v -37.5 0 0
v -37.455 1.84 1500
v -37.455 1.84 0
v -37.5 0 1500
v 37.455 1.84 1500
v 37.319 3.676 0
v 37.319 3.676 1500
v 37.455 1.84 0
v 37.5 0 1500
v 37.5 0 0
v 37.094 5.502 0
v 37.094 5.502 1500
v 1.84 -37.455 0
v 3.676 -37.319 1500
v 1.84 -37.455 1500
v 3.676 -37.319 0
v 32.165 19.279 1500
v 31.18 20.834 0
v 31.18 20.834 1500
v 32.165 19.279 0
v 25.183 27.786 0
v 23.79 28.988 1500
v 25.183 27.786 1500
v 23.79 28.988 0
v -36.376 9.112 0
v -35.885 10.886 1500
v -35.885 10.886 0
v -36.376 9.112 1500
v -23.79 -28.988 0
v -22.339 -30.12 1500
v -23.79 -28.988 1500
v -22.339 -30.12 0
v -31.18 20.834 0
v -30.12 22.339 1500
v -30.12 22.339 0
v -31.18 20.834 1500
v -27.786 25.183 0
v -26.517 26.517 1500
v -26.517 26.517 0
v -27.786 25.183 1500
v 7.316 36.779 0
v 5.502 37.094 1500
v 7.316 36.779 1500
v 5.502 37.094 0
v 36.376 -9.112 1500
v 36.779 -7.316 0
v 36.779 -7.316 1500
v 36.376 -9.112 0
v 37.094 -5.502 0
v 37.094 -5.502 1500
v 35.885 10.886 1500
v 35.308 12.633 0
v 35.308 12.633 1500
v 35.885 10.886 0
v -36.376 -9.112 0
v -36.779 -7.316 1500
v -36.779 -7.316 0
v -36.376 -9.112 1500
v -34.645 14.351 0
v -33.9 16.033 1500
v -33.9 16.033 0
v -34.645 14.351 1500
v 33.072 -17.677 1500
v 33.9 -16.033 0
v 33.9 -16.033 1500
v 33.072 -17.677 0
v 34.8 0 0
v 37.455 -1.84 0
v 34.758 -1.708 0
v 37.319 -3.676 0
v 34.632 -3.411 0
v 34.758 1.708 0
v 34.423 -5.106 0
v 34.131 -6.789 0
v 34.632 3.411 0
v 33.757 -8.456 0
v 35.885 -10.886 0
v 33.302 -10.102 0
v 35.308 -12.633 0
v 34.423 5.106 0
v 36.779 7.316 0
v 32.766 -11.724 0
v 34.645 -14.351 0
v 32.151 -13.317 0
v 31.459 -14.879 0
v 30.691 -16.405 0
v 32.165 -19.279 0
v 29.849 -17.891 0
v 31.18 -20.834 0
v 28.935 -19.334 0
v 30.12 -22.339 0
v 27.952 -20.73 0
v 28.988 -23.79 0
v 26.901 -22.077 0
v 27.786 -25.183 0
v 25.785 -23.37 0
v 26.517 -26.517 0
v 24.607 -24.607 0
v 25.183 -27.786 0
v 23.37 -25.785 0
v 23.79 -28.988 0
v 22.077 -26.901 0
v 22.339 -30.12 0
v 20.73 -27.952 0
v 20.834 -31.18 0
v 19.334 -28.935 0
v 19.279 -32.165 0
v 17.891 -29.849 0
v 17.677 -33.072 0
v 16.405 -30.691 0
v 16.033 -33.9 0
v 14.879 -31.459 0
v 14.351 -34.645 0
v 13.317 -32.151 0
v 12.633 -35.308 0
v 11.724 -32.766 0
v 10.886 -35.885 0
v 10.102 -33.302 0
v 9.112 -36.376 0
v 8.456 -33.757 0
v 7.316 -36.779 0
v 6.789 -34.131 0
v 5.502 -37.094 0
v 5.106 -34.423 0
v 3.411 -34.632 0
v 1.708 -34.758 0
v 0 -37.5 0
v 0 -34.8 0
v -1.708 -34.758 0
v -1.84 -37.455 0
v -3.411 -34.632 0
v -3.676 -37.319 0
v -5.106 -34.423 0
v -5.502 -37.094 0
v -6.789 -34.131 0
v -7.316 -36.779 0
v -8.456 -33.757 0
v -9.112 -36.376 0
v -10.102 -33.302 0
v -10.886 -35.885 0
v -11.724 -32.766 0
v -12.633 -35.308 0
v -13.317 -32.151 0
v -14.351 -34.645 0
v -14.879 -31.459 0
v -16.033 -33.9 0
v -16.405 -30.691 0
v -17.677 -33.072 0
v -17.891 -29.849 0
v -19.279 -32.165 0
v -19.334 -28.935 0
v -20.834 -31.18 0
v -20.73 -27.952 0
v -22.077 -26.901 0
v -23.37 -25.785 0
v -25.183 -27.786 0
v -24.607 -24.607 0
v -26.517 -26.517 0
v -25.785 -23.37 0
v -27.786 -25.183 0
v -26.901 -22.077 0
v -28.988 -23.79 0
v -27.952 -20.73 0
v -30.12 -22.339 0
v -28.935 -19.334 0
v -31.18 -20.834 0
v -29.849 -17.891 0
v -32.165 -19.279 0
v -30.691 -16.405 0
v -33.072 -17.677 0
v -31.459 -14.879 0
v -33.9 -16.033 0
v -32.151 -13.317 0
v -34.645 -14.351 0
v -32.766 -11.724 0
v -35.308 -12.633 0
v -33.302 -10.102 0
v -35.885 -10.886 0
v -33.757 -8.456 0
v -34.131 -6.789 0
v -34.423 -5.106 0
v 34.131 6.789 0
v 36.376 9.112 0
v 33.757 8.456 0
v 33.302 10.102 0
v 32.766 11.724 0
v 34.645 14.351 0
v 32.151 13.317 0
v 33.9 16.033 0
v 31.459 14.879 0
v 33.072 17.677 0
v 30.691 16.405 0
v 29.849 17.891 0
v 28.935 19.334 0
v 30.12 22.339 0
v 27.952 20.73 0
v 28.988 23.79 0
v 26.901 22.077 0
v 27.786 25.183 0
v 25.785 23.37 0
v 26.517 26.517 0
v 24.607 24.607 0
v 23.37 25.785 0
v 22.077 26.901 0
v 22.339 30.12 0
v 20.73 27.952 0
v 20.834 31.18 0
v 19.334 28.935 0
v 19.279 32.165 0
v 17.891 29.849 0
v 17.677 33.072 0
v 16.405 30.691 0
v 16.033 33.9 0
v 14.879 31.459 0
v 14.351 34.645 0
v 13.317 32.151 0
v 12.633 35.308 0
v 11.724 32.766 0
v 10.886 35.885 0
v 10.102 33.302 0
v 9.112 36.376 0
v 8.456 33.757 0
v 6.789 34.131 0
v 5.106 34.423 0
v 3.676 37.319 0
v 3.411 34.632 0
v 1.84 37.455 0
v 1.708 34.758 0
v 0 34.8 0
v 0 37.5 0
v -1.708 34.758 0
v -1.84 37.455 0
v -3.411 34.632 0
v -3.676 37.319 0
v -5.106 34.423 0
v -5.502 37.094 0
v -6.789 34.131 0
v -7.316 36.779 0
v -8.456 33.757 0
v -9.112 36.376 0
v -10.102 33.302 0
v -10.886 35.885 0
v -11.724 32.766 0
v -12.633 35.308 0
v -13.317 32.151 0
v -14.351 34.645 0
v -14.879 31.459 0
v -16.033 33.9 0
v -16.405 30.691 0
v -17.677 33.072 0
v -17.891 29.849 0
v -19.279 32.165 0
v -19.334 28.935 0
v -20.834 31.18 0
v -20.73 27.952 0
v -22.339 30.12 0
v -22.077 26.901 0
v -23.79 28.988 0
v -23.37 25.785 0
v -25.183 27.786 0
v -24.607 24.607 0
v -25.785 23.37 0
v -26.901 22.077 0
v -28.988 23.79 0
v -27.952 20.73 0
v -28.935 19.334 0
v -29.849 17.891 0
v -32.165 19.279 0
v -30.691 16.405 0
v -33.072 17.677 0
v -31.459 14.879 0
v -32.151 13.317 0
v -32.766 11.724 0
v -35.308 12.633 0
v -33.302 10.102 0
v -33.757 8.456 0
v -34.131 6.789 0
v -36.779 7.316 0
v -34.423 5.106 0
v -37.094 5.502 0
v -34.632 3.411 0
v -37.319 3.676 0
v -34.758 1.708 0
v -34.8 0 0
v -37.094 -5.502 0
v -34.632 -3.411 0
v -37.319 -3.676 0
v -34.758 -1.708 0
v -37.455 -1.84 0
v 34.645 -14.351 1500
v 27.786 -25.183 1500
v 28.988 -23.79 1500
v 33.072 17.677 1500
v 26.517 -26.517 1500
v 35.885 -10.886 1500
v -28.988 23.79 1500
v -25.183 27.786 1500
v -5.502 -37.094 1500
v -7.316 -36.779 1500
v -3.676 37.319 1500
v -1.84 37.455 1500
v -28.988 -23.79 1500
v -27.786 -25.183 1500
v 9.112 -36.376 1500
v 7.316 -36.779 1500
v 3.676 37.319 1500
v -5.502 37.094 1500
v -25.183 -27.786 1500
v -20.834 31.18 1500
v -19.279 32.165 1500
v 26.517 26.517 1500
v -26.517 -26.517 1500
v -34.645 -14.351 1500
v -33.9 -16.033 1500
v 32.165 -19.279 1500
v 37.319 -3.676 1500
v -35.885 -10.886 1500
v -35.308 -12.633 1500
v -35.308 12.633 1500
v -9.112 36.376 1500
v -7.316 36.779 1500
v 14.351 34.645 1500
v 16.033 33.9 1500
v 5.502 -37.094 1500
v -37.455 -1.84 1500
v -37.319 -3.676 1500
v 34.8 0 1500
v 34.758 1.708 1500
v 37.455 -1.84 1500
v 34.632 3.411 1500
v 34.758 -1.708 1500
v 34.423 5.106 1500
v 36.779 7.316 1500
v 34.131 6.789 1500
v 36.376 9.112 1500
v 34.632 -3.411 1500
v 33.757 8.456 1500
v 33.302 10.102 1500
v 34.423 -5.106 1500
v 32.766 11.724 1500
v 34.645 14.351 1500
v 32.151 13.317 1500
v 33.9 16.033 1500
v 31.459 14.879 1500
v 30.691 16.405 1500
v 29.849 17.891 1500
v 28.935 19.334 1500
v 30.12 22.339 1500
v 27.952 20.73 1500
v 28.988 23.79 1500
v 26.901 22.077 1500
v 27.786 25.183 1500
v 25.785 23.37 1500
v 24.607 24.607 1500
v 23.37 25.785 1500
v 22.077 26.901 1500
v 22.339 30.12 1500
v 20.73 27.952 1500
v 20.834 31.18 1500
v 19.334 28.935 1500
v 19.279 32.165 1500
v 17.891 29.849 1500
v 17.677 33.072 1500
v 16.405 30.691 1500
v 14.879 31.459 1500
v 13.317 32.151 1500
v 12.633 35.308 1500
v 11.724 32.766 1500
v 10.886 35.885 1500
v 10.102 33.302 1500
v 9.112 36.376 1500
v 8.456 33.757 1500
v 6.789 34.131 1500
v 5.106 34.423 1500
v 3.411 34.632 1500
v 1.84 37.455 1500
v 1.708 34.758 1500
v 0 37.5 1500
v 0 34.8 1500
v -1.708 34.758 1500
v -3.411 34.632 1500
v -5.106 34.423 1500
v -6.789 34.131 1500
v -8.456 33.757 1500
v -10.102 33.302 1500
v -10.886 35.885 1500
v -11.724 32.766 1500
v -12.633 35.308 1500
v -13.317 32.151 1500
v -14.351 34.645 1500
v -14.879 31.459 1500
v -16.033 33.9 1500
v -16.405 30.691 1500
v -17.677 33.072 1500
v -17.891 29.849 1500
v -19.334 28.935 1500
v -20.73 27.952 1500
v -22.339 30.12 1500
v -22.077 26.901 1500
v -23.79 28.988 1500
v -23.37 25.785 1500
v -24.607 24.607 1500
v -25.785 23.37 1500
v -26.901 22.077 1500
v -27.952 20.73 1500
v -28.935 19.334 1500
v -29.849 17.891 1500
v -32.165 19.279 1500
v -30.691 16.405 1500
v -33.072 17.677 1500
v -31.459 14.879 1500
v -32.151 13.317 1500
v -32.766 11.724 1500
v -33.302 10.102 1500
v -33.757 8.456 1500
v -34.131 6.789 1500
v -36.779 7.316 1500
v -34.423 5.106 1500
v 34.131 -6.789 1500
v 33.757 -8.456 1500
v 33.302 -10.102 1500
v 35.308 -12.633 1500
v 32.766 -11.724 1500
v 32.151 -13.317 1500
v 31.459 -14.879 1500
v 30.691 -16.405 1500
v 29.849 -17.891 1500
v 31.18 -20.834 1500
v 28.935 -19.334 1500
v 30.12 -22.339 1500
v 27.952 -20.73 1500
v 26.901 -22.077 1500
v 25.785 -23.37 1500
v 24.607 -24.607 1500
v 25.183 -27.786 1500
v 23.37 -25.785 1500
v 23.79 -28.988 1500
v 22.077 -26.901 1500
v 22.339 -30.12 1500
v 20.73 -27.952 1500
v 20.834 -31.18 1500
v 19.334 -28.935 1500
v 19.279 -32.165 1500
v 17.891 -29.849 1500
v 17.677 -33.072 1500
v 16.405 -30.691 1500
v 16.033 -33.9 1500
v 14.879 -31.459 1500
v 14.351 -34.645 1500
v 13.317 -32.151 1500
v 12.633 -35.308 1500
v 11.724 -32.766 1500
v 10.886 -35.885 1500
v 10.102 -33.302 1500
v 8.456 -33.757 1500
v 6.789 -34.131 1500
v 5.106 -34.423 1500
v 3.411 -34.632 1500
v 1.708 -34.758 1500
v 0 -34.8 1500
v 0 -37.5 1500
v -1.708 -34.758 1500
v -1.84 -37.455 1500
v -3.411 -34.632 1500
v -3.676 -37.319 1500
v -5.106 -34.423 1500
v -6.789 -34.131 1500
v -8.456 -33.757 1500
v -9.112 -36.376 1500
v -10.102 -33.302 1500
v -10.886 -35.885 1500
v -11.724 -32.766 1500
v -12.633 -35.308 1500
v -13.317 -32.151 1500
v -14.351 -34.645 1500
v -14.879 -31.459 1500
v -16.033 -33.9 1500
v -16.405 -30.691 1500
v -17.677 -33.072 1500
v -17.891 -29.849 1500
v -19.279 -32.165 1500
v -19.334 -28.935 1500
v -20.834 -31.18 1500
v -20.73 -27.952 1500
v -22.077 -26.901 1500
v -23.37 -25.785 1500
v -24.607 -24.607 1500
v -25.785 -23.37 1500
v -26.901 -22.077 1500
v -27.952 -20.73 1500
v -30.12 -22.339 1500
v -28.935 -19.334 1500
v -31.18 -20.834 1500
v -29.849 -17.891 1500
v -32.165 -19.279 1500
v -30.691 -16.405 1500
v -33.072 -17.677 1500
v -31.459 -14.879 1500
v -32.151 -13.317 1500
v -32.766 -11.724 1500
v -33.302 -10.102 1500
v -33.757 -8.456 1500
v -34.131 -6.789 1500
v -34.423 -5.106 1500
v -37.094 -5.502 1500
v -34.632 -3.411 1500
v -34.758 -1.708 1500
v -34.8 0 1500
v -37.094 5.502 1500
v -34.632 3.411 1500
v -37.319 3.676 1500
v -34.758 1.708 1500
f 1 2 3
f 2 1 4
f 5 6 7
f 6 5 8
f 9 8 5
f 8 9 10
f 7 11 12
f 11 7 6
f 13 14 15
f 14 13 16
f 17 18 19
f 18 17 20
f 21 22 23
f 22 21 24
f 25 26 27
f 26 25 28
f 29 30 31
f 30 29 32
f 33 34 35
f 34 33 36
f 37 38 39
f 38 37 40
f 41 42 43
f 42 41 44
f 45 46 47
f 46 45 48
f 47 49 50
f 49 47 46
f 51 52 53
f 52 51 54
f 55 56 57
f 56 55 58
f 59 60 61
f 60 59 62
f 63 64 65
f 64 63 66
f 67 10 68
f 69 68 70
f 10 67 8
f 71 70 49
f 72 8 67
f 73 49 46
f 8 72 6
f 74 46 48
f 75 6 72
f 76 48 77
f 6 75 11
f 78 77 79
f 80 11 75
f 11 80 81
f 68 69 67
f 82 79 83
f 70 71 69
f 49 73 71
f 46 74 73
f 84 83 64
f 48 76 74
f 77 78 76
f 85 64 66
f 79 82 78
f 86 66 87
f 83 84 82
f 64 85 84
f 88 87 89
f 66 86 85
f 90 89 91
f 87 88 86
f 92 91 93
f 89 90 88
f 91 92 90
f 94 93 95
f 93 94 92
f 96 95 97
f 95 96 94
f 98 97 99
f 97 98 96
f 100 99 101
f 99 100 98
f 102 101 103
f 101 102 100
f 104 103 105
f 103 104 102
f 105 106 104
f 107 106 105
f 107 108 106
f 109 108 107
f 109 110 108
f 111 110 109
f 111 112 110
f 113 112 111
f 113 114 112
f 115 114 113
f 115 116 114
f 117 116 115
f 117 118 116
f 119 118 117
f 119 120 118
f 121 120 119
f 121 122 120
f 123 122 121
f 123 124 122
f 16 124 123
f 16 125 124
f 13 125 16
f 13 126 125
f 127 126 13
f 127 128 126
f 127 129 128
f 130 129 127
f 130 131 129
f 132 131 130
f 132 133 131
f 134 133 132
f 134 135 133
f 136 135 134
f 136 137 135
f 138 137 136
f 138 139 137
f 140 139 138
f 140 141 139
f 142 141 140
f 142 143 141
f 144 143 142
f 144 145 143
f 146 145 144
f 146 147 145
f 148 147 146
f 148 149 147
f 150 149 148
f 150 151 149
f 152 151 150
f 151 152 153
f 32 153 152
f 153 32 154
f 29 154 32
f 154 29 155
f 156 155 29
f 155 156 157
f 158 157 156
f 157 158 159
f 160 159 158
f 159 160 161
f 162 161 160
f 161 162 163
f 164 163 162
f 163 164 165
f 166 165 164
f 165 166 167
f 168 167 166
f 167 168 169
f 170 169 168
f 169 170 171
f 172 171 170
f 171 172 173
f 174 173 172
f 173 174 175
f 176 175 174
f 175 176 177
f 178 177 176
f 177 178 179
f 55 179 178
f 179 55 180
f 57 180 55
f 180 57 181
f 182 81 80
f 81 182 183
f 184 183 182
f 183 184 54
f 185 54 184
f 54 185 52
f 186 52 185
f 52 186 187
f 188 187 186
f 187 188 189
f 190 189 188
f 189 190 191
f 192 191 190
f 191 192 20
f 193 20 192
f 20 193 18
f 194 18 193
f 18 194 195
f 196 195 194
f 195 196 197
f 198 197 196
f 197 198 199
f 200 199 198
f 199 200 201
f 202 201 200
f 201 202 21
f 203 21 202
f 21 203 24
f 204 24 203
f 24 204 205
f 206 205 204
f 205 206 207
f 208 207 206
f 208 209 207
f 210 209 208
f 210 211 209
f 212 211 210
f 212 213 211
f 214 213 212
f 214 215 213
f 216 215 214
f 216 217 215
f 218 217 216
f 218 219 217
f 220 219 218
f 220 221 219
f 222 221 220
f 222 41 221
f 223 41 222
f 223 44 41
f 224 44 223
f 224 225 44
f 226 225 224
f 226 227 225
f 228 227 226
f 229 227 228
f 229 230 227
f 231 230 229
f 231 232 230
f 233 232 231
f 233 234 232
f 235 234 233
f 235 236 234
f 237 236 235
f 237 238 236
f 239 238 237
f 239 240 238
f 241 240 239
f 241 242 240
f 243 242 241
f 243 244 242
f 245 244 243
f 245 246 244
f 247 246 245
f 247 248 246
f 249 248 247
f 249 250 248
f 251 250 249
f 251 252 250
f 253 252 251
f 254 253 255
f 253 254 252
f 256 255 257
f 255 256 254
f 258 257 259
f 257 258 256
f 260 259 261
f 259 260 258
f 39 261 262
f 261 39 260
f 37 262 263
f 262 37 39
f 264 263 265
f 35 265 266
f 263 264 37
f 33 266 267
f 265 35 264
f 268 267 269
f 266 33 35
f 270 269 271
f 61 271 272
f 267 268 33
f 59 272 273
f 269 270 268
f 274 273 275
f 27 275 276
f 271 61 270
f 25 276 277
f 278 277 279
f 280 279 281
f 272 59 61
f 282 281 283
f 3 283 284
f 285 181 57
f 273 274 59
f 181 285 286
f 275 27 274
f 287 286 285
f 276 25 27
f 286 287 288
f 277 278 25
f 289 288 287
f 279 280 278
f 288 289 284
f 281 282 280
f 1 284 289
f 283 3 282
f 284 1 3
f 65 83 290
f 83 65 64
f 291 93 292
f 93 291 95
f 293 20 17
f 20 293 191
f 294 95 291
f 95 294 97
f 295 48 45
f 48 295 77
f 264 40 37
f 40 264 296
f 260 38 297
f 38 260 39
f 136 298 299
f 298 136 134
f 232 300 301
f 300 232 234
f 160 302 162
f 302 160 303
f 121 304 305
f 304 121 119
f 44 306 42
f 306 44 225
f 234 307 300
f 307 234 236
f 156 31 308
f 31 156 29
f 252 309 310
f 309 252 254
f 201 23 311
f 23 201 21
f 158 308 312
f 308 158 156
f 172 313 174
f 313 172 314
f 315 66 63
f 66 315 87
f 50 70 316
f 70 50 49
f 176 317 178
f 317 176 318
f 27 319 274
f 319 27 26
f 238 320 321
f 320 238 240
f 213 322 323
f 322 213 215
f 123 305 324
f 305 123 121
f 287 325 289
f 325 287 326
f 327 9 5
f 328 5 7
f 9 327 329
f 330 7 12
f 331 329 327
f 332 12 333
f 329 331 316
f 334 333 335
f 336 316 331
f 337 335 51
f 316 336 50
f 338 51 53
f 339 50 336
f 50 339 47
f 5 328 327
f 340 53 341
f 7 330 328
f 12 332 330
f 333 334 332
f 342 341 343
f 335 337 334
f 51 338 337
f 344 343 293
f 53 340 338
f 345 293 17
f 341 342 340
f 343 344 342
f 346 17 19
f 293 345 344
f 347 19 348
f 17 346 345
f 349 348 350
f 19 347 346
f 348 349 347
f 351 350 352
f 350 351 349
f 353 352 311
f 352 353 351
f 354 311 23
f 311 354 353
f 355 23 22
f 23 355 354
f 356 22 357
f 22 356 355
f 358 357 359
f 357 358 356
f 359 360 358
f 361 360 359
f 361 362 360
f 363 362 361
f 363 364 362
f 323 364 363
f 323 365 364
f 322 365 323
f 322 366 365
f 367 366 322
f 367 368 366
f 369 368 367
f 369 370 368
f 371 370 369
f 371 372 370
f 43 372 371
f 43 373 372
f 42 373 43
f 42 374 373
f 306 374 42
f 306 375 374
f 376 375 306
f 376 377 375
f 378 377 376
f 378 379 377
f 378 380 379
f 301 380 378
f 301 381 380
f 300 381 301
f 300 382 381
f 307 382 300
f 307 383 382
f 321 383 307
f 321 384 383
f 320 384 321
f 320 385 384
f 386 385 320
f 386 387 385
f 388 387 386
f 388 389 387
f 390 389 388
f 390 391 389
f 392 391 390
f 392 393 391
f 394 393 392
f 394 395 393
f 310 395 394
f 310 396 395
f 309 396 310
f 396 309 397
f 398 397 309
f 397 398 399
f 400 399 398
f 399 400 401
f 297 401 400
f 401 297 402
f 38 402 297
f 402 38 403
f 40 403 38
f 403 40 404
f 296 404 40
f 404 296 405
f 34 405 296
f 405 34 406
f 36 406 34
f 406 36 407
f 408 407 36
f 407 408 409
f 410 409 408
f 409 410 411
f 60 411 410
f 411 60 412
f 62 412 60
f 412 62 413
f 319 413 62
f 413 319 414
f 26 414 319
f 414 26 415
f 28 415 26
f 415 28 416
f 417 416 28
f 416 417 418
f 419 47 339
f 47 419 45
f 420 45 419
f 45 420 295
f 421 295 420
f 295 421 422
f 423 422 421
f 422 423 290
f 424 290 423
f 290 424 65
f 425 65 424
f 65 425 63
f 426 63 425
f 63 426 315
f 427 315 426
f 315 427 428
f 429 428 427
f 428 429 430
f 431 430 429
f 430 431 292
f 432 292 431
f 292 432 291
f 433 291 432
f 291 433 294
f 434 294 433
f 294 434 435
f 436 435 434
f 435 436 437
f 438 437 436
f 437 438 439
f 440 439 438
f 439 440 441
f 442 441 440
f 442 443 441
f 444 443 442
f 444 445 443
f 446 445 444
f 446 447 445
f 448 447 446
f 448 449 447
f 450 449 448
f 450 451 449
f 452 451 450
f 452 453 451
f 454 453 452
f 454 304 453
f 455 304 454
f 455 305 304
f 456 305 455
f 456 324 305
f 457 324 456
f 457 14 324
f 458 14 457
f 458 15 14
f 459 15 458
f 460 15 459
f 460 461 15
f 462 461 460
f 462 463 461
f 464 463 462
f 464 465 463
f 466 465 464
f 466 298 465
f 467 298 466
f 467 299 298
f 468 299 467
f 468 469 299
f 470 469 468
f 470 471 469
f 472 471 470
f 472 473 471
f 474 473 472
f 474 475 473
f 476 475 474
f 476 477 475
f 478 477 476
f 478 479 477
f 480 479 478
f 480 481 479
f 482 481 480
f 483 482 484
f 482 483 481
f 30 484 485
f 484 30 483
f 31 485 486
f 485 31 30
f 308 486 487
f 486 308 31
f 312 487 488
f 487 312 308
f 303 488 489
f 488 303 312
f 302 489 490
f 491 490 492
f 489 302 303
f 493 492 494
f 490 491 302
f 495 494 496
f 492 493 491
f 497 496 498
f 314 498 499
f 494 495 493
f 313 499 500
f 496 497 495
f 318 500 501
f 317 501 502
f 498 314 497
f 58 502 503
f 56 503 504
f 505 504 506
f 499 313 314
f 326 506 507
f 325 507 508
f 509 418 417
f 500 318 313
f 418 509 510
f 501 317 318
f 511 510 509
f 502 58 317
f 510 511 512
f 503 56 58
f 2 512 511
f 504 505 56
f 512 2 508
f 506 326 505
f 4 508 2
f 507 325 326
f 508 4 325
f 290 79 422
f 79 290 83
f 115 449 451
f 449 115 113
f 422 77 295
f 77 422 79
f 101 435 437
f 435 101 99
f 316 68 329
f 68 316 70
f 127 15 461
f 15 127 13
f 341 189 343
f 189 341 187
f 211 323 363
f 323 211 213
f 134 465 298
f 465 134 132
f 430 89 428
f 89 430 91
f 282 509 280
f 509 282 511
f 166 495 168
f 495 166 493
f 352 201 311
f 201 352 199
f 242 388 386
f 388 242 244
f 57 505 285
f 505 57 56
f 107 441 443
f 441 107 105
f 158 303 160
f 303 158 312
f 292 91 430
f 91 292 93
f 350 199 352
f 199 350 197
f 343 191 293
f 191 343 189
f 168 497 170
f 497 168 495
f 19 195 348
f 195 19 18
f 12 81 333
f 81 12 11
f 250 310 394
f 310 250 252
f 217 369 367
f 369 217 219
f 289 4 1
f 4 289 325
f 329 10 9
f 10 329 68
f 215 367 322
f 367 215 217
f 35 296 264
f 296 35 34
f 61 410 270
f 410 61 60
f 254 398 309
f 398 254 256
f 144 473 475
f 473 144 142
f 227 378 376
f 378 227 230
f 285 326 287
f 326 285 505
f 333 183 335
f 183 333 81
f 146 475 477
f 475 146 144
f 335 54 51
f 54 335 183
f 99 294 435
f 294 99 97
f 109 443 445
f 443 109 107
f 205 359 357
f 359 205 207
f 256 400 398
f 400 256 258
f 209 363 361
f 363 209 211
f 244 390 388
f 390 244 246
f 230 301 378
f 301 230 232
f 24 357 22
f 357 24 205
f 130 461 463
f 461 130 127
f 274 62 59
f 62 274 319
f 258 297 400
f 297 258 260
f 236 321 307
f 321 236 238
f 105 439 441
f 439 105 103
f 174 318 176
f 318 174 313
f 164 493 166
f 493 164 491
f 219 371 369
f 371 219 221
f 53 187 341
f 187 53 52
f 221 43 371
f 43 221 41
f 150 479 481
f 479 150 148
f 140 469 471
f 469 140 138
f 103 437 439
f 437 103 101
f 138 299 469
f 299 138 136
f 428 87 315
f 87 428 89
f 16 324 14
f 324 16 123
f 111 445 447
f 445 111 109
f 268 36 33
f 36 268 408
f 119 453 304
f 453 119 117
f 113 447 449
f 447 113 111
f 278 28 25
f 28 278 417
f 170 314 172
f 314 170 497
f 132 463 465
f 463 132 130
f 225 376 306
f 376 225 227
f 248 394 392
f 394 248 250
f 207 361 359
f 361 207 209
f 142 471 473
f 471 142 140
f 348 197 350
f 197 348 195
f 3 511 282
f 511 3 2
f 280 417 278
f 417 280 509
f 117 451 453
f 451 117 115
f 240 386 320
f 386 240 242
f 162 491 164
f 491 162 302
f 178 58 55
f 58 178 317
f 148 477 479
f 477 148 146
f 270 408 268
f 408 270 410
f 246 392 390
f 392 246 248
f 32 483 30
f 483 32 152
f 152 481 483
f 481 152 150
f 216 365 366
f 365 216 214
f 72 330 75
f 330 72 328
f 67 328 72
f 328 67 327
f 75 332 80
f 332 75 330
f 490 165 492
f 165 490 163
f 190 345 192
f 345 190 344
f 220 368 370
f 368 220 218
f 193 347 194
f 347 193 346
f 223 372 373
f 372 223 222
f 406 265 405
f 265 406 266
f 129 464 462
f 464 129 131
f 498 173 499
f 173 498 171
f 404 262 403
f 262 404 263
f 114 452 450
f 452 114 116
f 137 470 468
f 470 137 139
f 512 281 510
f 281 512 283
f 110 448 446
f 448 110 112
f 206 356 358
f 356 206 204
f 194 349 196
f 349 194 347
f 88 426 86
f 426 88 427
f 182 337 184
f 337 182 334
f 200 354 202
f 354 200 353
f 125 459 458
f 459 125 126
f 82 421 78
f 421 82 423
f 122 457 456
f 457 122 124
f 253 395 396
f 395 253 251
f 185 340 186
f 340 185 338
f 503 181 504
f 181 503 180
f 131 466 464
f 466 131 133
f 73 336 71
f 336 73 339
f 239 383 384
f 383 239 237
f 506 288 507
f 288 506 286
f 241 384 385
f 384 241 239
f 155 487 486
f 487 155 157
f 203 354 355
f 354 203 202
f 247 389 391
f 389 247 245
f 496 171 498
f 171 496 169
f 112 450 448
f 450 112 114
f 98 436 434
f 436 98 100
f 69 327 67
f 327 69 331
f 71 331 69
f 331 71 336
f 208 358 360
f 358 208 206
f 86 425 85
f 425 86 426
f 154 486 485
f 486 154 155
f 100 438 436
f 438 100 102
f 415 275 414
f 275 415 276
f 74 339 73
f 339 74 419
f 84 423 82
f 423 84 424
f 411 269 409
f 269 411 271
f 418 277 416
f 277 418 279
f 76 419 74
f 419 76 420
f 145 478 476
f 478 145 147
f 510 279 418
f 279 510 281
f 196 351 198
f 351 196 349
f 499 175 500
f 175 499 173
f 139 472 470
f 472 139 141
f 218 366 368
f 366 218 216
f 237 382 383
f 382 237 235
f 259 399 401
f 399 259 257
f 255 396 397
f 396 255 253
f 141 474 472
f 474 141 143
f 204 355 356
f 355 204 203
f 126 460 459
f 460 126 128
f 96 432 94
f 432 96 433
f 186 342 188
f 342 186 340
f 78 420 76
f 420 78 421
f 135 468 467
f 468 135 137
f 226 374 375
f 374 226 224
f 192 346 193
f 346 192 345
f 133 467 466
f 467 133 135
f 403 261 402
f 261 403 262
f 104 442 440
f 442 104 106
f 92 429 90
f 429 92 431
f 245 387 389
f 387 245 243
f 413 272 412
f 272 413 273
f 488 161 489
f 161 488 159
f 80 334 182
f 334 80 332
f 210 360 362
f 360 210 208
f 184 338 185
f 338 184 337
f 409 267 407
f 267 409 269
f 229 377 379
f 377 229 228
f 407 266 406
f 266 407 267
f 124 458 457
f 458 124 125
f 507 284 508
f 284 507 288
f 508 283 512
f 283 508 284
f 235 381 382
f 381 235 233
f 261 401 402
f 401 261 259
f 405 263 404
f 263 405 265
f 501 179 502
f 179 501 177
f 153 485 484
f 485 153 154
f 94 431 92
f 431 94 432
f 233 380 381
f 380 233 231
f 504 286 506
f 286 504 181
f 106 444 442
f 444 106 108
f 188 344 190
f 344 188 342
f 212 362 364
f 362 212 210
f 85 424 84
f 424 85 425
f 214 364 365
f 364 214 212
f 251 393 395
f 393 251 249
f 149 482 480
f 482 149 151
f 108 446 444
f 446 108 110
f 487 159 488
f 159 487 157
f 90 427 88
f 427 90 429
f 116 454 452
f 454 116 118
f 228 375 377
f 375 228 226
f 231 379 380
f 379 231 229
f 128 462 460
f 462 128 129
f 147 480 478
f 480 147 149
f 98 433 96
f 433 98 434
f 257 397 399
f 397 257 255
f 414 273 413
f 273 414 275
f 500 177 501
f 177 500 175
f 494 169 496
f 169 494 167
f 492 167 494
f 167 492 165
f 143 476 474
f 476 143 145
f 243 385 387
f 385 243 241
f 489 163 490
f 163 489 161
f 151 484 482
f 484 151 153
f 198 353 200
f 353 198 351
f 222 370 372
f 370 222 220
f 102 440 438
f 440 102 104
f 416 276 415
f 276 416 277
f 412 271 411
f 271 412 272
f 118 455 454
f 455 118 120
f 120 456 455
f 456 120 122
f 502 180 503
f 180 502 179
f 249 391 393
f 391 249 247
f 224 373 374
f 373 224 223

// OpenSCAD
$fn = 128;

// HT pipe parameters (approximate for HT 75)
pipe_length = 1500;          // mm
outer_diameter = 75;         // mm (nominal)
wall_thickness = 2.7;        // mm (typical HT pipe wall)
inner_diameter = outer_diameter - 2*wall_thickness;

module ht_pipe(od, id, len) {
    difference() {
        cylinder(h = len, d = od, center = false);
        translate([0,0,-0.5])
            cylinder(h = len + 1, d = id, center = false);
    }
}

ht_pipe(outer_diameter, inner_diameter, pipe_length);
